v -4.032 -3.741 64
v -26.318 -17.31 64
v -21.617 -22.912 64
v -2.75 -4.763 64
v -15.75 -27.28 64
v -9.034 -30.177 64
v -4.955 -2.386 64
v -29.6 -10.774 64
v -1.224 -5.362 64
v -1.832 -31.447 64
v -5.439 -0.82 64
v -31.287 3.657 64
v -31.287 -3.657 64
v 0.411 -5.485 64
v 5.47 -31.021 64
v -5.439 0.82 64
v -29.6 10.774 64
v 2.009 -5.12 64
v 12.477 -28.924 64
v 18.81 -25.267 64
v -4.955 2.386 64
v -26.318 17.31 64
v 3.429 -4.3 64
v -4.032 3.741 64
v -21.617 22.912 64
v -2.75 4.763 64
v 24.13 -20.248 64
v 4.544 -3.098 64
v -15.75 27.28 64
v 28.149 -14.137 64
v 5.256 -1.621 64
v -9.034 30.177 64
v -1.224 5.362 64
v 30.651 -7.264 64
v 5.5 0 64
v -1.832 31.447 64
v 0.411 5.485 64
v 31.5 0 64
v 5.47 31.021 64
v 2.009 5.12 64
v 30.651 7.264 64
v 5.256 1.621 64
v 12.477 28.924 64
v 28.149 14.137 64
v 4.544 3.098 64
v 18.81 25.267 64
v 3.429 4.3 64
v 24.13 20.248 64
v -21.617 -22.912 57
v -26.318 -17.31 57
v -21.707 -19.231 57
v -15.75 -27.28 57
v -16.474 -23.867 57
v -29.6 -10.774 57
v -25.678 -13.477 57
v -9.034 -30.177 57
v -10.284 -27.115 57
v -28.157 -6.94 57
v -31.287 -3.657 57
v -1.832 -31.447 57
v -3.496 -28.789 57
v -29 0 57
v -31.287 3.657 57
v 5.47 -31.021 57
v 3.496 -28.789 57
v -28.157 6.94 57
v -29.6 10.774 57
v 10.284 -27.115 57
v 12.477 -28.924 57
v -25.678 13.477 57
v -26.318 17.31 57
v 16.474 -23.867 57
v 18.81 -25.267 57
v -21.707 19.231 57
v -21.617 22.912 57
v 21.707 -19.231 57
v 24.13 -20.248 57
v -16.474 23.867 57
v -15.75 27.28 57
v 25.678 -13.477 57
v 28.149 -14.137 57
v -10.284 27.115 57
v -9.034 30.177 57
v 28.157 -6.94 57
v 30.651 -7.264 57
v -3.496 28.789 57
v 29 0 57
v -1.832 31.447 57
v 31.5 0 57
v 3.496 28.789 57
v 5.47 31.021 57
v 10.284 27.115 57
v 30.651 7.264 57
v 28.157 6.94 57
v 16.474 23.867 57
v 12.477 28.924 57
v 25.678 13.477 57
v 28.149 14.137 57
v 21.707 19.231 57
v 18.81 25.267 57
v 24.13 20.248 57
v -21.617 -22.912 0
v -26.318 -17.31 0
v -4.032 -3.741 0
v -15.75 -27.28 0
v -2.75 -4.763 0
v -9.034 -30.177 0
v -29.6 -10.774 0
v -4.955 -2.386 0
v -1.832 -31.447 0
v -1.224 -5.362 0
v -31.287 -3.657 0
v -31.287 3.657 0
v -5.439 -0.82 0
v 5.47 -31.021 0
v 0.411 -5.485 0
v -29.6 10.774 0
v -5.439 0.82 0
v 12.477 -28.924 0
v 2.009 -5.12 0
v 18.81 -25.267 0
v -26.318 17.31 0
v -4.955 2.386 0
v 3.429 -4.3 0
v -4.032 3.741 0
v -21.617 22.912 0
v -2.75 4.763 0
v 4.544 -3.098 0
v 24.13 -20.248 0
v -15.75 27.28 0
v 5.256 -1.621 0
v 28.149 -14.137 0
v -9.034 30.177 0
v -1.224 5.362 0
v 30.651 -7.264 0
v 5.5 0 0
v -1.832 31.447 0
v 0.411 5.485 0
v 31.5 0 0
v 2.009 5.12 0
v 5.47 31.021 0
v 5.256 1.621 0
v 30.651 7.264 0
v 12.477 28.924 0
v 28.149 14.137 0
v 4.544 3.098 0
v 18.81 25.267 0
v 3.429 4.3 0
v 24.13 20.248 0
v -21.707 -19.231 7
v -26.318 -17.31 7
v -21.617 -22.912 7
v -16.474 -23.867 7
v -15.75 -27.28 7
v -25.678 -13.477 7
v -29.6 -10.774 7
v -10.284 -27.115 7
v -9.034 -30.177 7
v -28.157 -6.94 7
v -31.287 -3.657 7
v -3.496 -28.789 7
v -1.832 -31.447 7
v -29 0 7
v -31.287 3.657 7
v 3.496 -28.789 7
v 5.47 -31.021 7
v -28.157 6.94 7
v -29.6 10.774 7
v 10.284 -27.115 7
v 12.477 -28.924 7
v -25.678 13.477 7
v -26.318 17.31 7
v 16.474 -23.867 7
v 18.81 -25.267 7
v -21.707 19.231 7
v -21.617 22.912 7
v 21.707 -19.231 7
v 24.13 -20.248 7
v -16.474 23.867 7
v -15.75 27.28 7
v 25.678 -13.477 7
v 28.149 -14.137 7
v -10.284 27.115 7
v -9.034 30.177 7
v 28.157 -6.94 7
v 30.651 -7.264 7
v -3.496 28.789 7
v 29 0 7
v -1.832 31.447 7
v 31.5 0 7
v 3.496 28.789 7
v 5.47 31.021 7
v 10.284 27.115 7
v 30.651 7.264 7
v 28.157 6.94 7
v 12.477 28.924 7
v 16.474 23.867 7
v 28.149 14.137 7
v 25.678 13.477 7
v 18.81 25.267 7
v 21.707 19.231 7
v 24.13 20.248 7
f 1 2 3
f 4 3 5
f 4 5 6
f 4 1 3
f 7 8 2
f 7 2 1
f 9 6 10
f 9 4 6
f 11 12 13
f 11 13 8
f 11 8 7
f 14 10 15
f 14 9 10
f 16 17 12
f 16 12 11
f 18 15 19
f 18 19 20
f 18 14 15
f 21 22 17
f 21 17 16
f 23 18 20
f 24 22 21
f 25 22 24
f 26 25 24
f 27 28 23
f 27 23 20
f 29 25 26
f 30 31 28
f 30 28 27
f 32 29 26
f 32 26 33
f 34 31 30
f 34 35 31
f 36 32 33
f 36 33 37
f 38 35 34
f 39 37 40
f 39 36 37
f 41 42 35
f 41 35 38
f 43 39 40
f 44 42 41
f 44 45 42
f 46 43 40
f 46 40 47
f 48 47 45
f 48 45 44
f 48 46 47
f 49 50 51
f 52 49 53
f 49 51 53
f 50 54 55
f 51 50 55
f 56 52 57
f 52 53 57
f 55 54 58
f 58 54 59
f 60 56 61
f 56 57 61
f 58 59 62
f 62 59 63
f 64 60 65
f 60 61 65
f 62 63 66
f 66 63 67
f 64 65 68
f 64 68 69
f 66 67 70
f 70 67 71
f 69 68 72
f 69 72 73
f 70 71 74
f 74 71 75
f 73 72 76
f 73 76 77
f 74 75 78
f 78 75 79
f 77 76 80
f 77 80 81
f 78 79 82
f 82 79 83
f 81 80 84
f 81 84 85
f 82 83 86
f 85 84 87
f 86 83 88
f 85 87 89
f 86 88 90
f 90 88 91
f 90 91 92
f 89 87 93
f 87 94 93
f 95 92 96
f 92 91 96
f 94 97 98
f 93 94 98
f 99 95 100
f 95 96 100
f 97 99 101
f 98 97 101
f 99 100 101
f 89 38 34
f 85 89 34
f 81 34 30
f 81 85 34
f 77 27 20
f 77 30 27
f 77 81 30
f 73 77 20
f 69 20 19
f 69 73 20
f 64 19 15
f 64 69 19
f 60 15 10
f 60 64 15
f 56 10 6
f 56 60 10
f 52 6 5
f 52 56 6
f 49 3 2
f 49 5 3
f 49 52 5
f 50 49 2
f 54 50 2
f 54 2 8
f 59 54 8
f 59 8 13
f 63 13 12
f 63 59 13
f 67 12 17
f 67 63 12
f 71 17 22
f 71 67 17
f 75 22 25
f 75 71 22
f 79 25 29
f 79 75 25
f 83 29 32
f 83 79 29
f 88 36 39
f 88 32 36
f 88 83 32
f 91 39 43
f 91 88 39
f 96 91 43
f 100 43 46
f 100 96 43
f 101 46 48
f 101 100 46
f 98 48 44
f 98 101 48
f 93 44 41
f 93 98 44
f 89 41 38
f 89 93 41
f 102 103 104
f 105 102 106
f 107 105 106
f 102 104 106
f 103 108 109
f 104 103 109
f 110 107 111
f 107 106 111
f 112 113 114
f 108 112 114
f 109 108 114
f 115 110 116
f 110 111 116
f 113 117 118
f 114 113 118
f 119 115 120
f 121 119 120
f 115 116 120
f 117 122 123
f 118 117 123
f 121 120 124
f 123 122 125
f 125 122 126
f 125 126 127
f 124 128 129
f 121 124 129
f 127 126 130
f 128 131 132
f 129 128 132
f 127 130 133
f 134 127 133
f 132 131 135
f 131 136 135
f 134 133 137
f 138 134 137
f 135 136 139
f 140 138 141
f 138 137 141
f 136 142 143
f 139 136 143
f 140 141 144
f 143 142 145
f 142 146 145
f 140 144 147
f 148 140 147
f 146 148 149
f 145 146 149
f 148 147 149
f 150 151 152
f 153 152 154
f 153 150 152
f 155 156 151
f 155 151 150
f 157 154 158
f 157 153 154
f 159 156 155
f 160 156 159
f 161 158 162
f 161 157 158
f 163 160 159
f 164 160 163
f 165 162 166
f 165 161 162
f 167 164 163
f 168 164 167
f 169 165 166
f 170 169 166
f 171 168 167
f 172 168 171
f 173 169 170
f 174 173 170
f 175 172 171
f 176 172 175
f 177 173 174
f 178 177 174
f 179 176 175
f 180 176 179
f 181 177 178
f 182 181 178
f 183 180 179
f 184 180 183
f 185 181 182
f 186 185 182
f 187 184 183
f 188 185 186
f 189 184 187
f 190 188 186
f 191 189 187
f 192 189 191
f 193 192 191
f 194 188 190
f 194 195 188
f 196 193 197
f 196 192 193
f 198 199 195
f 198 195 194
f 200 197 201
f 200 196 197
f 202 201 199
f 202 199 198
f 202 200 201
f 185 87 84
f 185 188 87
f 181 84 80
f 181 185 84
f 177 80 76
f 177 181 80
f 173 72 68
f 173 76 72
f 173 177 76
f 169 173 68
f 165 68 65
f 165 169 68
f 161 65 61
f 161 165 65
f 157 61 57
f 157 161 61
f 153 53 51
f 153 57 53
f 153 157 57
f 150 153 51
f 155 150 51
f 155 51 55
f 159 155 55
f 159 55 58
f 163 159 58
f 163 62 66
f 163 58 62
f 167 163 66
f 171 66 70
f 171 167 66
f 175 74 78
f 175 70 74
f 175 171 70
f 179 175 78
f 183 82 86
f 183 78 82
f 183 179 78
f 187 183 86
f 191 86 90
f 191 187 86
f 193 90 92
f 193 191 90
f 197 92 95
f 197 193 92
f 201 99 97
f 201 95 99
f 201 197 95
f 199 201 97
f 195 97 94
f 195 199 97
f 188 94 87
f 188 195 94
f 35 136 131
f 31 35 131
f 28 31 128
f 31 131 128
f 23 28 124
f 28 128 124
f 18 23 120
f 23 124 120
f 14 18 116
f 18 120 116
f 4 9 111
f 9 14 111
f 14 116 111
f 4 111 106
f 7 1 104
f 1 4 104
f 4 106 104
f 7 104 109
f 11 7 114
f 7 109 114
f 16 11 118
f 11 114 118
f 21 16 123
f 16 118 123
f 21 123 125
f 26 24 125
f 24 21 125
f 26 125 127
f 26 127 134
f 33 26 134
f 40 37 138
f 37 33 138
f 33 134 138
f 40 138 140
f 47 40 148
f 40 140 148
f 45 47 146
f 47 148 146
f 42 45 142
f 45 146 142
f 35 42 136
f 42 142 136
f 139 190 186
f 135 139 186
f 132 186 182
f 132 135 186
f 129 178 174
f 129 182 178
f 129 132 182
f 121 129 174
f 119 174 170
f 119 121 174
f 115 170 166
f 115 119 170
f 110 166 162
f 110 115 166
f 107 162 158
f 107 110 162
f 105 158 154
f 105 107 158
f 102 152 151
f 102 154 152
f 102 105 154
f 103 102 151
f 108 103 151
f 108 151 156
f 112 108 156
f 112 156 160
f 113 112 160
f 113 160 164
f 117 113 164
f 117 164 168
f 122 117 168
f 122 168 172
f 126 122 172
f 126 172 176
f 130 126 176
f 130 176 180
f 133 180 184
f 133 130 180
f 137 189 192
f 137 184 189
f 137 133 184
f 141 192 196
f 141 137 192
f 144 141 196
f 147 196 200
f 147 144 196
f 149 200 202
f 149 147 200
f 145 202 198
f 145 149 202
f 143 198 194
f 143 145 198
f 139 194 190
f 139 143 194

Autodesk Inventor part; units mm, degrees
ref_plane "YZ Plane" through (0, 0, 0) normal (1, 0, 0) x (0, 1, 0)
ref_plane "XZ Plane" through (0, 0, 0) normal (0, 1, 0) x (-1, 0, 0)
ref_plane "XY Plane" through (0, 0, 0) normal (0, 0, 1) x (1, 0, 0)
sketch "Skizze2" plane through (0, 0, 0) normal (0, 1, 0) x (-1, 0, 0)
  line L0 (-5.5, 64) -> (-31.5, 64)
  line L1 (-31.5, 64) -> (-31.5, 57)
  line L2 (-31.5, 57) -> (-29, 57)
  line L3 (-29, 57) -> (-29, 7)
  line L4 (-29, 7) -> (-31.5, 7)
  line L5 (-31.5, 7) -> (-31.5, 0)
  line L6 (-31.5, 0) -> (-5.5, 0)
  line L7 (0, 32) -> (-29, 32) construction
  line L8 (0, 0) -> (0, 64)
  line L9 (-5.5, 64) -> (-5.5, 0)
  point P0 (-5.5, 32)
  dimension "d3" = 7
  dimension "d4" = 64
  dimension "d5" = 11
  dimension "d6" = 63
  dimension "d7" = 58
revolve "Umdrehung1" add sketch "Skizze2" angle 360 about axis through (0, 0, 0) along (0, 0, 1)
properties part number "Kupferspule 500g" material "PC/ABS-Kunststoff"
